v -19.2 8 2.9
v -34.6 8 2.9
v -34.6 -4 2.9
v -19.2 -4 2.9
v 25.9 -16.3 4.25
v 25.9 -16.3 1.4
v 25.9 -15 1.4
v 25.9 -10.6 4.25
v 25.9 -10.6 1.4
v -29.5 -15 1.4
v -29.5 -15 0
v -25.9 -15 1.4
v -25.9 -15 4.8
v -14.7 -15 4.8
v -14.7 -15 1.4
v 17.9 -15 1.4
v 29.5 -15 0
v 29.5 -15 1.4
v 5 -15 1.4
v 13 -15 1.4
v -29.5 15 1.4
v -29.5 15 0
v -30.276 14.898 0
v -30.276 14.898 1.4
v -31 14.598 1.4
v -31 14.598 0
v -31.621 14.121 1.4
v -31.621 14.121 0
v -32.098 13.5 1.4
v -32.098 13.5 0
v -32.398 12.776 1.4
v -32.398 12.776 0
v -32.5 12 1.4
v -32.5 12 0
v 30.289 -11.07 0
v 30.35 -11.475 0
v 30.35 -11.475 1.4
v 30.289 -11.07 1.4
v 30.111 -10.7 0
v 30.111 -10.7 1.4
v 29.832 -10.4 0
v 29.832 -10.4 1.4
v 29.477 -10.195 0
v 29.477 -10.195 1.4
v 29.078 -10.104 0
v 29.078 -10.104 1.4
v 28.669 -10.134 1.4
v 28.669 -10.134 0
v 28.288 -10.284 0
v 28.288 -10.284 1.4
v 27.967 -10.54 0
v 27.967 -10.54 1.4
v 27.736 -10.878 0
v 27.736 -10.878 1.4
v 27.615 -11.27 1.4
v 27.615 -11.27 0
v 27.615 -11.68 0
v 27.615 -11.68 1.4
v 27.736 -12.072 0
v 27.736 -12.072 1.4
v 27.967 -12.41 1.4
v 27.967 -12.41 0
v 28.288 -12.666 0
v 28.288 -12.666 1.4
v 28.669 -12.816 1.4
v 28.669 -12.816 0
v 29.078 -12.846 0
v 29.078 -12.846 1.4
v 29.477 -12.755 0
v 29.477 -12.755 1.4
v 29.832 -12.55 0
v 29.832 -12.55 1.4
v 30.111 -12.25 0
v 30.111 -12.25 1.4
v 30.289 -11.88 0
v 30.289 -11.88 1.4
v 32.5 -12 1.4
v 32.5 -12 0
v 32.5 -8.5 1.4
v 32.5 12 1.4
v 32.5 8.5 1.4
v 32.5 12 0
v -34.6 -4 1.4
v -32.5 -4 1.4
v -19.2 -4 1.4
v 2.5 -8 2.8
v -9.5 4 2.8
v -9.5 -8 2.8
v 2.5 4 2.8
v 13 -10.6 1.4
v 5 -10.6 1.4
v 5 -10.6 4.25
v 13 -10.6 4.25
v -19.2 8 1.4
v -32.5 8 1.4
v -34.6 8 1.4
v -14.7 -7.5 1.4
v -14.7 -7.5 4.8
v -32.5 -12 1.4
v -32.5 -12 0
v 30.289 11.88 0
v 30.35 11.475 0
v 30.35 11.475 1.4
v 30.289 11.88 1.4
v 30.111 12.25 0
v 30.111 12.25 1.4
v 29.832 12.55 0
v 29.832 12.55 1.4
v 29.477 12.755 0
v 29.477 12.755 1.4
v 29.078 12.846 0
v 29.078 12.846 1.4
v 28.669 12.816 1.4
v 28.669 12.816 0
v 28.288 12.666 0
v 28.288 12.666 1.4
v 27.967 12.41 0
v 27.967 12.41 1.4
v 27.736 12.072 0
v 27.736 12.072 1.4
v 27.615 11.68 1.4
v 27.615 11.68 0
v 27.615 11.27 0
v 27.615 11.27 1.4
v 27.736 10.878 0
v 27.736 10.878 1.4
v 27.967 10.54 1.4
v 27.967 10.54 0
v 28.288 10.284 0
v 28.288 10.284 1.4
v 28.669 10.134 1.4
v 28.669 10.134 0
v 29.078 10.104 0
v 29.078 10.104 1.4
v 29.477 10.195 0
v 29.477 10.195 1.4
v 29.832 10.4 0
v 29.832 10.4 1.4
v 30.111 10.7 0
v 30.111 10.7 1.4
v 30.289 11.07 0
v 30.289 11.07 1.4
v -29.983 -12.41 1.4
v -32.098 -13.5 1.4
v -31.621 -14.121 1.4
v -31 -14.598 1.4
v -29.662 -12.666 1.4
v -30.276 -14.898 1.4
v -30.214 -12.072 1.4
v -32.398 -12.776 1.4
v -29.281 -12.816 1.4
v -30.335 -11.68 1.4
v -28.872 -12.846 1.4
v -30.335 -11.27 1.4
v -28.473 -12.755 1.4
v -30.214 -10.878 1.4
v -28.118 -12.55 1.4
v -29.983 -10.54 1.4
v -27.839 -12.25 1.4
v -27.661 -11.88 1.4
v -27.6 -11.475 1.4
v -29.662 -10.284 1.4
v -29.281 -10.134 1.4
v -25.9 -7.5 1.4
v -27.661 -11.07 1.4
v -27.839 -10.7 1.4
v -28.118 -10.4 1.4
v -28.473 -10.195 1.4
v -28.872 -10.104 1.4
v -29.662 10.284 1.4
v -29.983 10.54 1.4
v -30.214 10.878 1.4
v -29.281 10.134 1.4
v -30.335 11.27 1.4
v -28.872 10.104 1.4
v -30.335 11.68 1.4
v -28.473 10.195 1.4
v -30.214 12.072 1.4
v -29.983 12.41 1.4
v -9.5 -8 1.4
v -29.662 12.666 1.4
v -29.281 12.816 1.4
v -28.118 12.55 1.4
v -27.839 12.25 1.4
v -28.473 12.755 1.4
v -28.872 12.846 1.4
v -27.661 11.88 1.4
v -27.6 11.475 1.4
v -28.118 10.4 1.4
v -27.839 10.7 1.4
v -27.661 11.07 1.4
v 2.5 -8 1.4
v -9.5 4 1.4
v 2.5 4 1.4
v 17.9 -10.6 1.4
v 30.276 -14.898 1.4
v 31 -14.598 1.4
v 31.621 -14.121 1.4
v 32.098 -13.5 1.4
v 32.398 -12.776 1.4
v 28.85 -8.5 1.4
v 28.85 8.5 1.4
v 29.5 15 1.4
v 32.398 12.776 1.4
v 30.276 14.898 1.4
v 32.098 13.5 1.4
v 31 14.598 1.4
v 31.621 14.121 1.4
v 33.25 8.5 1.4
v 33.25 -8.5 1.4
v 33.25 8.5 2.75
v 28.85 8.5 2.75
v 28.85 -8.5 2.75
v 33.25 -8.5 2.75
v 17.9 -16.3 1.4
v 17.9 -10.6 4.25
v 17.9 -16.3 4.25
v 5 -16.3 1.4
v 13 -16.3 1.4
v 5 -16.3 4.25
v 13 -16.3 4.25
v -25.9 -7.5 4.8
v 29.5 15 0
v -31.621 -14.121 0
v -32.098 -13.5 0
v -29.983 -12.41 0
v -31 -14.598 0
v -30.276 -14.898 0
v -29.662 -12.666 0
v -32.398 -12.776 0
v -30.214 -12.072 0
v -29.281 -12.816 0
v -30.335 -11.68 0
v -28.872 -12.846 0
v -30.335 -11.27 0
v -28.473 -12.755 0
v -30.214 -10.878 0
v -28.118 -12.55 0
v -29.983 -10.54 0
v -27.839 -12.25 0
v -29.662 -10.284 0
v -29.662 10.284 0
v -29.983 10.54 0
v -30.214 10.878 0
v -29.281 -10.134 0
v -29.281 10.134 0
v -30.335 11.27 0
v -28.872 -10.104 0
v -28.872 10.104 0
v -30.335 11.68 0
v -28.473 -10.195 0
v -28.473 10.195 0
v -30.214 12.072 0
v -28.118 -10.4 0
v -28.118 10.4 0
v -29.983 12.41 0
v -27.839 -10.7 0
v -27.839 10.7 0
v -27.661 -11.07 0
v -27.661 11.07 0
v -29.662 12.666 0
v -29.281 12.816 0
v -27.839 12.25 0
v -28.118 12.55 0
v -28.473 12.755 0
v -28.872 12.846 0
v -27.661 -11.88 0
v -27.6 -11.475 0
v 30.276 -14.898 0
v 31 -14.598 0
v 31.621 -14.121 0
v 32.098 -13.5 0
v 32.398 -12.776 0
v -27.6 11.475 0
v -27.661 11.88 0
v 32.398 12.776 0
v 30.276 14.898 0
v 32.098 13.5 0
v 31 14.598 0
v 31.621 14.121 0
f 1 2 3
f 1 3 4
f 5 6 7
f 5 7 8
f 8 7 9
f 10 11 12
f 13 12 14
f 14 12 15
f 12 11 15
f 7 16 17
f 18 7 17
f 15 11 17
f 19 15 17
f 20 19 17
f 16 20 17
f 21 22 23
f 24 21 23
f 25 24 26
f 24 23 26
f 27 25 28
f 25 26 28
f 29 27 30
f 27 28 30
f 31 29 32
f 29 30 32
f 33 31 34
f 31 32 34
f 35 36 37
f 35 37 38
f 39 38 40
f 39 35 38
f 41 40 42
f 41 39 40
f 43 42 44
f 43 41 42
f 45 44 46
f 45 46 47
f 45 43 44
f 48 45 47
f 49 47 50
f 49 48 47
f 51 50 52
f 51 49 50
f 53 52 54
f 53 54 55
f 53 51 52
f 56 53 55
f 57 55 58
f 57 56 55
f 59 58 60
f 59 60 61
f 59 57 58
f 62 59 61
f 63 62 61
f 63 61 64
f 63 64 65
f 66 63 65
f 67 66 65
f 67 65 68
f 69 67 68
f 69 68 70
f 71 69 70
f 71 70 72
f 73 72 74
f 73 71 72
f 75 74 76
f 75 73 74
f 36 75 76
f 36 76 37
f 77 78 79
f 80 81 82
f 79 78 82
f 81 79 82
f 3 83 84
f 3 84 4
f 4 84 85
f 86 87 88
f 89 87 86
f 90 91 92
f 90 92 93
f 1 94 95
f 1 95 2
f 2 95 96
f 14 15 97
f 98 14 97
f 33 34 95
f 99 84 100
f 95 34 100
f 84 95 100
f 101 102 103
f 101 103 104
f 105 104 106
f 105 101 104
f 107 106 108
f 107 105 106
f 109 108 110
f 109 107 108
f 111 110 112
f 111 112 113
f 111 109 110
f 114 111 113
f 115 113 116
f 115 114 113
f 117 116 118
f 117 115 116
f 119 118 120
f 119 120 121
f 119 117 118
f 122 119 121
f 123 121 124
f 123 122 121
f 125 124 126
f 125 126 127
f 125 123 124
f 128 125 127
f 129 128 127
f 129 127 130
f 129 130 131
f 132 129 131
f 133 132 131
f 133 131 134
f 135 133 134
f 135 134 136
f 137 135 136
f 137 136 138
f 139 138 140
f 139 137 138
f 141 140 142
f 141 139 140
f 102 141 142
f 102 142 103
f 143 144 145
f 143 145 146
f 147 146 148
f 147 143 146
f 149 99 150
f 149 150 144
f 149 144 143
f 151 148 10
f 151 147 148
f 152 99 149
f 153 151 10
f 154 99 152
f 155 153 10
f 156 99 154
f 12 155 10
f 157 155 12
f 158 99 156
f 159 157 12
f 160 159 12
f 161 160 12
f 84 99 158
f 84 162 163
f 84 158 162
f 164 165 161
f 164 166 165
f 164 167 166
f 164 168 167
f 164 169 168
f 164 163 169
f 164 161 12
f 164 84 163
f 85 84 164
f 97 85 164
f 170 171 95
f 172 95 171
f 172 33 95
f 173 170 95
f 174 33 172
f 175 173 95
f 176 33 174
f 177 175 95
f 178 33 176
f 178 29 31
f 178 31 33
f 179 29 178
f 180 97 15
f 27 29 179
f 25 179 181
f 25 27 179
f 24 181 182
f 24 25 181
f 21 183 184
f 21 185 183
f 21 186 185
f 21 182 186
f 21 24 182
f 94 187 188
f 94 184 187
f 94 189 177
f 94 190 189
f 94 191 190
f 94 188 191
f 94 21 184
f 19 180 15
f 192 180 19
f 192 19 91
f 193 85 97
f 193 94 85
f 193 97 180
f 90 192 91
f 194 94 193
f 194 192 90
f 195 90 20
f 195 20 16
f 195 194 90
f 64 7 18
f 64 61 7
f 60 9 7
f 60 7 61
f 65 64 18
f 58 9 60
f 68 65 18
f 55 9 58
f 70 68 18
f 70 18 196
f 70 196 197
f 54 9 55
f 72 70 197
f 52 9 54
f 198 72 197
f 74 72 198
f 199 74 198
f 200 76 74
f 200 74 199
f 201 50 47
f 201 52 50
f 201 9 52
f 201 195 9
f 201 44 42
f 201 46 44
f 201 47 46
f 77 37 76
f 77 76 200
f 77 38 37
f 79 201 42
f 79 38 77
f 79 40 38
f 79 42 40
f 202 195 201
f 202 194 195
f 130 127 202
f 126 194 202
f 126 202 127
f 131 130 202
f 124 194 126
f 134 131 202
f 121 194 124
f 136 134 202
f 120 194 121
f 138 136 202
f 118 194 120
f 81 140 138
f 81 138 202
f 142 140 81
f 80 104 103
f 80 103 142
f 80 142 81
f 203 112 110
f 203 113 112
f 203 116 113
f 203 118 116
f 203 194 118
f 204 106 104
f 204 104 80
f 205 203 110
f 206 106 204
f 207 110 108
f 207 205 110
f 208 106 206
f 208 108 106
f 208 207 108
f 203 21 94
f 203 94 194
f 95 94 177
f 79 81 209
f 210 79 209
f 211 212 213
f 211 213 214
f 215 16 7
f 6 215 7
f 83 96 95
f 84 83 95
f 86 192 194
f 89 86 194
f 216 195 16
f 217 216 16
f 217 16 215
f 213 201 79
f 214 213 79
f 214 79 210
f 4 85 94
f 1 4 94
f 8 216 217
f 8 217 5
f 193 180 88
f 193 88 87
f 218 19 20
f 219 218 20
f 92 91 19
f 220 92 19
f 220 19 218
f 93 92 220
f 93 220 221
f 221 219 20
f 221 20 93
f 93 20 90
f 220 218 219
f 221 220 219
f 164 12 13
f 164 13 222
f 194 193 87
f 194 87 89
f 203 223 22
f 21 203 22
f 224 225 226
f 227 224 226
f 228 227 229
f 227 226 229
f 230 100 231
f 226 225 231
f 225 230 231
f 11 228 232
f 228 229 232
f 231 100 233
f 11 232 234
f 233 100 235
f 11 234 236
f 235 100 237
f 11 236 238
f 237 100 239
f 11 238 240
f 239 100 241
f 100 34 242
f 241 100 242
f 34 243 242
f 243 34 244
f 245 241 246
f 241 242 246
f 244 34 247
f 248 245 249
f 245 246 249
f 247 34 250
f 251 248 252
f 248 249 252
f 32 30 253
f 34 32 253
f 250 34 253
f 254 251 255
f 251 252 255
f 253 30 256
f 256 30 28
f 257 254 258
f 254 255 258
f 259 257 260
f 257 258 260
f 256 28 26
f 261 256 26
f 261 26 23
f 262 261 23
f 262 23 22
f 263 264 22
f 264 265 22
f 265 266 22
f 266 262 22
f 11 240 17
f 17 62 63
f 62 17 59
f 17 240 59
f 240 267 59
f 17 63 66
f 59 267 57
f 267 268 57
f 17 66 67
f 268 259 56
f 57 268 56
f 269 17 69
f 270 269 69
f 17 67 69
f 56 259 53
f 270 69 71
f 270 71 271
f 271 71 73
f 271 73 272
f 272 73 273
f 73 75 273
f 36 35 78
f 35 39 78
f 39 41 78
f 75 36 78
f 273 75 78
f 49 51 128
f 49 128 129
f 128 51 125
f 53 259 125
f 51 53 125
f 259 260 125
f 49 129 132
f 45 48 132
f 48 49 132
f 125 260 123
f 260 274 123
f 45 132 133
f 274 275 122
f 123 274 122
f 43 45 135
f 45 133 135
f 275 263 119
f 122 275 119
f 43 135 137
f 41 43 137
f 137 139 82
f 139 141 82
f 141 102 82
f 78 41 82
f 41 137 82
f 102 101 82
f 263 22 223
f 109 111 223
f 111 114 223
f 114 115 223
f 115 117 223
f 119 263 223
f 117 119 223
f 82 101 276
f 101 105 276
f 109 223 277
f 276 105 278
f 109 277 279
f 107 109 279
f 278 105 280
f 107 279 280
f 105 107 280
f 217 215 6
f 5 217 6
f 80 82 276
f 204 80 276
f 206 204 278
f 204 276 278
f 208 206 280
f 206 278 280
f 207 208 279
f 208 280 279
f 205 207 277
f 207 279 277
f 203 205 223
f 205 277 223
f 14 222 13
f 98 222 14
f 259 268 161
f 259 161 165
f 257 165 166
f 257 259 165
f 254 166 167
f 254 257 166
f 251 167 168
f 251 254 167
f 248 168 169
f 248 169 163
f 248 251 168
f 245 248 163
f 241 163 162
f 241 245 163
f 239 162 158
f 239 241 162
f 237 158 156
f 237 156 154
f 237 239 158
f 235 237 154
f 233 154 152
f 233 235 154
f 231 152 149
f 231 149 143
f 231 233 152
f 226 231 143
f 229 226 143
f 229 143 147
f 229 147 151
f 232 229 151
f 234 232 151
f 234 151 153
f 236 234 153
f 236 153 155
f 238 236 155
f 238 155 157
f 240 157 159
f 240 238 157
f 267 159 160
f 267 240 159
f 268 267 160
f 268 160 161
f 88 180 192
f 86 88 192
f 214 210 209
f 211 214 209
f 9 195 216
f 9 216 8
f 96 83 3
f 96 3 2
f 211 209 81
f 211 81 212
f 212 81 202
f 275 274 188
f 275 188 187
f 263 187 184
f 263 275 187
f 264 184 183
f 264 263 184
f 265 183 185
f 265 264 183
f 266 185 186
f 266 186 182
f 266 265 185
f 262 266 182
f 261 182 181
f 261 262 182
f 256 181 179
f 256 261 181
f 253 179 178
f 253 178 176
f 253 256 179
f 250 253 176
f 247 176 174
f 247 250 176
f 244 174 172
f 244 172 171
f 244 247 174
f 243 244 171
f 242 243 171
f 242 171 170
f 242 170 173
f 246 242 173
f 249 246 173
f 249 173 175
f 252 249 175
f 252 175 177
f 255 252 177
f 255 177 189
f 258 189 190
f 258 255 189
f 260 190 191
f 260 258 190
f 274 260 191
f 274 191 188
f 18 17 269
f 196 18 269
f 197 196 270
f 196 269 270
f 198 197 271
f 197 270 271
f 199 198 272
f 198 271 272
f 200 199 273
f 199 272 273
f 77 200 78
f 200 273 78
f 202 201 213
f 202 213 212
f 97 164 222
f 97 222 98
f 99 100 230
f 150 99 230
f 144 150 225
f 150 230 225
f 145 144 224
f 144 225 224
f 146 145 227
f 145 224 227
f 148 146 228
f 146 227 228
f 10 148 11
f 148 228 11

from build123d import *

# Parameters (mm, degrees)
F0_R     = 1.375
F1_DEPTH = 1.4
F2_W     = 12
F2_H     = 12
F3_DEPTH = 1.4
F2_W_2   = 11.2
F2_H_2   = 7.5
F4_DEPTH = 3.4
F2_W_3   = 8
F2_H_3   = 4.4
F2_H_4   = 1.3
F5_DEPTH = 2.85
F2_W_4   = 3.65
F2_H_5   = 17
F2_W_5   = 0.75
F6_DEPTH = 1.35
F2_W_6   = 2.1
F2_W_7   = 13.3
F7_DEPTH = 1.5


with BuildPart() as f1:
    # F0 (on Top) → F1 (new body)
    with BuildSketch(Plane.XY):
        with BuildLine():
            Line((-29.5, -15), (29.5, -15))
            ThreePointArc((29.5, -15), (31.62132, -14.12132), (32.5, -12))
            Line((32.5, -12), (32.5, 12))
            ThreePointArc((32.5, 12), (31.62132, 14.12132), (29.5, 15))
            Line((29.5, 15), (-29.5, 15))
            ThreePointArc((-29.5, 15), (-31.62132, 14.12132), (-32.5, 12))
            Line((-32.5, 12), (-32.5, -12))
            ThreePointArc((-32.5, -12), (-31.62132, -14.12132), (-29.5, -15))
        make_face()
        with Locations((-28.975, -11.475)):
            Circle(F0_R, mode=Mode.SUBTRACT)
        with Locations((28.975, -11.475)):
            Circle(F0_R, mode=Mode.SUBTRACT)
        with Locations((-28.975, 11.475)):
            Circle(F0_R, mode=Mode.SUBTRACT)
        with Locations((28.975, 11.475)):
            Circle(F0_R, mode=Mode.SUBTRACT)
    extrude(amount=F1_DEPTH)

    # F2 (on face) → F3 (join)
    with BuildSketch(Plane.XY.offset(1.4)):
        with Locations((-3.5, -2)):
            Rectangle(F2_W, F2_H)
    extrude(amount=F3_DEPTH)

    # F2 (on face) → F4 (join)
    with BuildSketch(Plane.XY.offset(1.4)):
        with Locations((-20.3, -11.25)):
            Rectangle(F2_W_2, F2_H_2)
    extrude(amount=F4_DEPTH)

    # F2 (on face) → F5 (join)
    with BuildSketch(Plane.XY.offset(1.4)):
        with Locations((9, -12.8)):
            Rectangle(F2_W_3, F2_H_3)
        with Locations((21.9, -12.8)):
            Rectangle(F2_W_3, F2_H_3)
        with Locations((21.9, -15.65)):
            Rectangle(F2_W_3, F2_H_4)
        with Locations((9, -15.65)):
            Rectangle(F2_W_3, F2_H_4)
    extrude(amount=F5_DEPTH)

    # F2 (on face) → F6 (join)
    with BuildSketch(Plane.XY.offset(1.4)):
        with Locations((30.675, 0)):
            Rectangle(F2_W_4, F2_H_5)
        with Locations((32.875, 0)):
            Rectangle(F2_W_5, F2_H_5)
    extrude(amount=F6_DEPTH)

    # F2 (on face) → F7 (join)
    with BuildSketch(Plane.XY.offset(1.4)):
        with Locations((-33.55, 2)):
            Rectangle(F2_W_6, F2_H)
        with Locations((-25.85, 2)):
            Rectangle(F2_W_7, F2_H)
    extrude(amount=F7_DEPTH)


solid = f1.part
